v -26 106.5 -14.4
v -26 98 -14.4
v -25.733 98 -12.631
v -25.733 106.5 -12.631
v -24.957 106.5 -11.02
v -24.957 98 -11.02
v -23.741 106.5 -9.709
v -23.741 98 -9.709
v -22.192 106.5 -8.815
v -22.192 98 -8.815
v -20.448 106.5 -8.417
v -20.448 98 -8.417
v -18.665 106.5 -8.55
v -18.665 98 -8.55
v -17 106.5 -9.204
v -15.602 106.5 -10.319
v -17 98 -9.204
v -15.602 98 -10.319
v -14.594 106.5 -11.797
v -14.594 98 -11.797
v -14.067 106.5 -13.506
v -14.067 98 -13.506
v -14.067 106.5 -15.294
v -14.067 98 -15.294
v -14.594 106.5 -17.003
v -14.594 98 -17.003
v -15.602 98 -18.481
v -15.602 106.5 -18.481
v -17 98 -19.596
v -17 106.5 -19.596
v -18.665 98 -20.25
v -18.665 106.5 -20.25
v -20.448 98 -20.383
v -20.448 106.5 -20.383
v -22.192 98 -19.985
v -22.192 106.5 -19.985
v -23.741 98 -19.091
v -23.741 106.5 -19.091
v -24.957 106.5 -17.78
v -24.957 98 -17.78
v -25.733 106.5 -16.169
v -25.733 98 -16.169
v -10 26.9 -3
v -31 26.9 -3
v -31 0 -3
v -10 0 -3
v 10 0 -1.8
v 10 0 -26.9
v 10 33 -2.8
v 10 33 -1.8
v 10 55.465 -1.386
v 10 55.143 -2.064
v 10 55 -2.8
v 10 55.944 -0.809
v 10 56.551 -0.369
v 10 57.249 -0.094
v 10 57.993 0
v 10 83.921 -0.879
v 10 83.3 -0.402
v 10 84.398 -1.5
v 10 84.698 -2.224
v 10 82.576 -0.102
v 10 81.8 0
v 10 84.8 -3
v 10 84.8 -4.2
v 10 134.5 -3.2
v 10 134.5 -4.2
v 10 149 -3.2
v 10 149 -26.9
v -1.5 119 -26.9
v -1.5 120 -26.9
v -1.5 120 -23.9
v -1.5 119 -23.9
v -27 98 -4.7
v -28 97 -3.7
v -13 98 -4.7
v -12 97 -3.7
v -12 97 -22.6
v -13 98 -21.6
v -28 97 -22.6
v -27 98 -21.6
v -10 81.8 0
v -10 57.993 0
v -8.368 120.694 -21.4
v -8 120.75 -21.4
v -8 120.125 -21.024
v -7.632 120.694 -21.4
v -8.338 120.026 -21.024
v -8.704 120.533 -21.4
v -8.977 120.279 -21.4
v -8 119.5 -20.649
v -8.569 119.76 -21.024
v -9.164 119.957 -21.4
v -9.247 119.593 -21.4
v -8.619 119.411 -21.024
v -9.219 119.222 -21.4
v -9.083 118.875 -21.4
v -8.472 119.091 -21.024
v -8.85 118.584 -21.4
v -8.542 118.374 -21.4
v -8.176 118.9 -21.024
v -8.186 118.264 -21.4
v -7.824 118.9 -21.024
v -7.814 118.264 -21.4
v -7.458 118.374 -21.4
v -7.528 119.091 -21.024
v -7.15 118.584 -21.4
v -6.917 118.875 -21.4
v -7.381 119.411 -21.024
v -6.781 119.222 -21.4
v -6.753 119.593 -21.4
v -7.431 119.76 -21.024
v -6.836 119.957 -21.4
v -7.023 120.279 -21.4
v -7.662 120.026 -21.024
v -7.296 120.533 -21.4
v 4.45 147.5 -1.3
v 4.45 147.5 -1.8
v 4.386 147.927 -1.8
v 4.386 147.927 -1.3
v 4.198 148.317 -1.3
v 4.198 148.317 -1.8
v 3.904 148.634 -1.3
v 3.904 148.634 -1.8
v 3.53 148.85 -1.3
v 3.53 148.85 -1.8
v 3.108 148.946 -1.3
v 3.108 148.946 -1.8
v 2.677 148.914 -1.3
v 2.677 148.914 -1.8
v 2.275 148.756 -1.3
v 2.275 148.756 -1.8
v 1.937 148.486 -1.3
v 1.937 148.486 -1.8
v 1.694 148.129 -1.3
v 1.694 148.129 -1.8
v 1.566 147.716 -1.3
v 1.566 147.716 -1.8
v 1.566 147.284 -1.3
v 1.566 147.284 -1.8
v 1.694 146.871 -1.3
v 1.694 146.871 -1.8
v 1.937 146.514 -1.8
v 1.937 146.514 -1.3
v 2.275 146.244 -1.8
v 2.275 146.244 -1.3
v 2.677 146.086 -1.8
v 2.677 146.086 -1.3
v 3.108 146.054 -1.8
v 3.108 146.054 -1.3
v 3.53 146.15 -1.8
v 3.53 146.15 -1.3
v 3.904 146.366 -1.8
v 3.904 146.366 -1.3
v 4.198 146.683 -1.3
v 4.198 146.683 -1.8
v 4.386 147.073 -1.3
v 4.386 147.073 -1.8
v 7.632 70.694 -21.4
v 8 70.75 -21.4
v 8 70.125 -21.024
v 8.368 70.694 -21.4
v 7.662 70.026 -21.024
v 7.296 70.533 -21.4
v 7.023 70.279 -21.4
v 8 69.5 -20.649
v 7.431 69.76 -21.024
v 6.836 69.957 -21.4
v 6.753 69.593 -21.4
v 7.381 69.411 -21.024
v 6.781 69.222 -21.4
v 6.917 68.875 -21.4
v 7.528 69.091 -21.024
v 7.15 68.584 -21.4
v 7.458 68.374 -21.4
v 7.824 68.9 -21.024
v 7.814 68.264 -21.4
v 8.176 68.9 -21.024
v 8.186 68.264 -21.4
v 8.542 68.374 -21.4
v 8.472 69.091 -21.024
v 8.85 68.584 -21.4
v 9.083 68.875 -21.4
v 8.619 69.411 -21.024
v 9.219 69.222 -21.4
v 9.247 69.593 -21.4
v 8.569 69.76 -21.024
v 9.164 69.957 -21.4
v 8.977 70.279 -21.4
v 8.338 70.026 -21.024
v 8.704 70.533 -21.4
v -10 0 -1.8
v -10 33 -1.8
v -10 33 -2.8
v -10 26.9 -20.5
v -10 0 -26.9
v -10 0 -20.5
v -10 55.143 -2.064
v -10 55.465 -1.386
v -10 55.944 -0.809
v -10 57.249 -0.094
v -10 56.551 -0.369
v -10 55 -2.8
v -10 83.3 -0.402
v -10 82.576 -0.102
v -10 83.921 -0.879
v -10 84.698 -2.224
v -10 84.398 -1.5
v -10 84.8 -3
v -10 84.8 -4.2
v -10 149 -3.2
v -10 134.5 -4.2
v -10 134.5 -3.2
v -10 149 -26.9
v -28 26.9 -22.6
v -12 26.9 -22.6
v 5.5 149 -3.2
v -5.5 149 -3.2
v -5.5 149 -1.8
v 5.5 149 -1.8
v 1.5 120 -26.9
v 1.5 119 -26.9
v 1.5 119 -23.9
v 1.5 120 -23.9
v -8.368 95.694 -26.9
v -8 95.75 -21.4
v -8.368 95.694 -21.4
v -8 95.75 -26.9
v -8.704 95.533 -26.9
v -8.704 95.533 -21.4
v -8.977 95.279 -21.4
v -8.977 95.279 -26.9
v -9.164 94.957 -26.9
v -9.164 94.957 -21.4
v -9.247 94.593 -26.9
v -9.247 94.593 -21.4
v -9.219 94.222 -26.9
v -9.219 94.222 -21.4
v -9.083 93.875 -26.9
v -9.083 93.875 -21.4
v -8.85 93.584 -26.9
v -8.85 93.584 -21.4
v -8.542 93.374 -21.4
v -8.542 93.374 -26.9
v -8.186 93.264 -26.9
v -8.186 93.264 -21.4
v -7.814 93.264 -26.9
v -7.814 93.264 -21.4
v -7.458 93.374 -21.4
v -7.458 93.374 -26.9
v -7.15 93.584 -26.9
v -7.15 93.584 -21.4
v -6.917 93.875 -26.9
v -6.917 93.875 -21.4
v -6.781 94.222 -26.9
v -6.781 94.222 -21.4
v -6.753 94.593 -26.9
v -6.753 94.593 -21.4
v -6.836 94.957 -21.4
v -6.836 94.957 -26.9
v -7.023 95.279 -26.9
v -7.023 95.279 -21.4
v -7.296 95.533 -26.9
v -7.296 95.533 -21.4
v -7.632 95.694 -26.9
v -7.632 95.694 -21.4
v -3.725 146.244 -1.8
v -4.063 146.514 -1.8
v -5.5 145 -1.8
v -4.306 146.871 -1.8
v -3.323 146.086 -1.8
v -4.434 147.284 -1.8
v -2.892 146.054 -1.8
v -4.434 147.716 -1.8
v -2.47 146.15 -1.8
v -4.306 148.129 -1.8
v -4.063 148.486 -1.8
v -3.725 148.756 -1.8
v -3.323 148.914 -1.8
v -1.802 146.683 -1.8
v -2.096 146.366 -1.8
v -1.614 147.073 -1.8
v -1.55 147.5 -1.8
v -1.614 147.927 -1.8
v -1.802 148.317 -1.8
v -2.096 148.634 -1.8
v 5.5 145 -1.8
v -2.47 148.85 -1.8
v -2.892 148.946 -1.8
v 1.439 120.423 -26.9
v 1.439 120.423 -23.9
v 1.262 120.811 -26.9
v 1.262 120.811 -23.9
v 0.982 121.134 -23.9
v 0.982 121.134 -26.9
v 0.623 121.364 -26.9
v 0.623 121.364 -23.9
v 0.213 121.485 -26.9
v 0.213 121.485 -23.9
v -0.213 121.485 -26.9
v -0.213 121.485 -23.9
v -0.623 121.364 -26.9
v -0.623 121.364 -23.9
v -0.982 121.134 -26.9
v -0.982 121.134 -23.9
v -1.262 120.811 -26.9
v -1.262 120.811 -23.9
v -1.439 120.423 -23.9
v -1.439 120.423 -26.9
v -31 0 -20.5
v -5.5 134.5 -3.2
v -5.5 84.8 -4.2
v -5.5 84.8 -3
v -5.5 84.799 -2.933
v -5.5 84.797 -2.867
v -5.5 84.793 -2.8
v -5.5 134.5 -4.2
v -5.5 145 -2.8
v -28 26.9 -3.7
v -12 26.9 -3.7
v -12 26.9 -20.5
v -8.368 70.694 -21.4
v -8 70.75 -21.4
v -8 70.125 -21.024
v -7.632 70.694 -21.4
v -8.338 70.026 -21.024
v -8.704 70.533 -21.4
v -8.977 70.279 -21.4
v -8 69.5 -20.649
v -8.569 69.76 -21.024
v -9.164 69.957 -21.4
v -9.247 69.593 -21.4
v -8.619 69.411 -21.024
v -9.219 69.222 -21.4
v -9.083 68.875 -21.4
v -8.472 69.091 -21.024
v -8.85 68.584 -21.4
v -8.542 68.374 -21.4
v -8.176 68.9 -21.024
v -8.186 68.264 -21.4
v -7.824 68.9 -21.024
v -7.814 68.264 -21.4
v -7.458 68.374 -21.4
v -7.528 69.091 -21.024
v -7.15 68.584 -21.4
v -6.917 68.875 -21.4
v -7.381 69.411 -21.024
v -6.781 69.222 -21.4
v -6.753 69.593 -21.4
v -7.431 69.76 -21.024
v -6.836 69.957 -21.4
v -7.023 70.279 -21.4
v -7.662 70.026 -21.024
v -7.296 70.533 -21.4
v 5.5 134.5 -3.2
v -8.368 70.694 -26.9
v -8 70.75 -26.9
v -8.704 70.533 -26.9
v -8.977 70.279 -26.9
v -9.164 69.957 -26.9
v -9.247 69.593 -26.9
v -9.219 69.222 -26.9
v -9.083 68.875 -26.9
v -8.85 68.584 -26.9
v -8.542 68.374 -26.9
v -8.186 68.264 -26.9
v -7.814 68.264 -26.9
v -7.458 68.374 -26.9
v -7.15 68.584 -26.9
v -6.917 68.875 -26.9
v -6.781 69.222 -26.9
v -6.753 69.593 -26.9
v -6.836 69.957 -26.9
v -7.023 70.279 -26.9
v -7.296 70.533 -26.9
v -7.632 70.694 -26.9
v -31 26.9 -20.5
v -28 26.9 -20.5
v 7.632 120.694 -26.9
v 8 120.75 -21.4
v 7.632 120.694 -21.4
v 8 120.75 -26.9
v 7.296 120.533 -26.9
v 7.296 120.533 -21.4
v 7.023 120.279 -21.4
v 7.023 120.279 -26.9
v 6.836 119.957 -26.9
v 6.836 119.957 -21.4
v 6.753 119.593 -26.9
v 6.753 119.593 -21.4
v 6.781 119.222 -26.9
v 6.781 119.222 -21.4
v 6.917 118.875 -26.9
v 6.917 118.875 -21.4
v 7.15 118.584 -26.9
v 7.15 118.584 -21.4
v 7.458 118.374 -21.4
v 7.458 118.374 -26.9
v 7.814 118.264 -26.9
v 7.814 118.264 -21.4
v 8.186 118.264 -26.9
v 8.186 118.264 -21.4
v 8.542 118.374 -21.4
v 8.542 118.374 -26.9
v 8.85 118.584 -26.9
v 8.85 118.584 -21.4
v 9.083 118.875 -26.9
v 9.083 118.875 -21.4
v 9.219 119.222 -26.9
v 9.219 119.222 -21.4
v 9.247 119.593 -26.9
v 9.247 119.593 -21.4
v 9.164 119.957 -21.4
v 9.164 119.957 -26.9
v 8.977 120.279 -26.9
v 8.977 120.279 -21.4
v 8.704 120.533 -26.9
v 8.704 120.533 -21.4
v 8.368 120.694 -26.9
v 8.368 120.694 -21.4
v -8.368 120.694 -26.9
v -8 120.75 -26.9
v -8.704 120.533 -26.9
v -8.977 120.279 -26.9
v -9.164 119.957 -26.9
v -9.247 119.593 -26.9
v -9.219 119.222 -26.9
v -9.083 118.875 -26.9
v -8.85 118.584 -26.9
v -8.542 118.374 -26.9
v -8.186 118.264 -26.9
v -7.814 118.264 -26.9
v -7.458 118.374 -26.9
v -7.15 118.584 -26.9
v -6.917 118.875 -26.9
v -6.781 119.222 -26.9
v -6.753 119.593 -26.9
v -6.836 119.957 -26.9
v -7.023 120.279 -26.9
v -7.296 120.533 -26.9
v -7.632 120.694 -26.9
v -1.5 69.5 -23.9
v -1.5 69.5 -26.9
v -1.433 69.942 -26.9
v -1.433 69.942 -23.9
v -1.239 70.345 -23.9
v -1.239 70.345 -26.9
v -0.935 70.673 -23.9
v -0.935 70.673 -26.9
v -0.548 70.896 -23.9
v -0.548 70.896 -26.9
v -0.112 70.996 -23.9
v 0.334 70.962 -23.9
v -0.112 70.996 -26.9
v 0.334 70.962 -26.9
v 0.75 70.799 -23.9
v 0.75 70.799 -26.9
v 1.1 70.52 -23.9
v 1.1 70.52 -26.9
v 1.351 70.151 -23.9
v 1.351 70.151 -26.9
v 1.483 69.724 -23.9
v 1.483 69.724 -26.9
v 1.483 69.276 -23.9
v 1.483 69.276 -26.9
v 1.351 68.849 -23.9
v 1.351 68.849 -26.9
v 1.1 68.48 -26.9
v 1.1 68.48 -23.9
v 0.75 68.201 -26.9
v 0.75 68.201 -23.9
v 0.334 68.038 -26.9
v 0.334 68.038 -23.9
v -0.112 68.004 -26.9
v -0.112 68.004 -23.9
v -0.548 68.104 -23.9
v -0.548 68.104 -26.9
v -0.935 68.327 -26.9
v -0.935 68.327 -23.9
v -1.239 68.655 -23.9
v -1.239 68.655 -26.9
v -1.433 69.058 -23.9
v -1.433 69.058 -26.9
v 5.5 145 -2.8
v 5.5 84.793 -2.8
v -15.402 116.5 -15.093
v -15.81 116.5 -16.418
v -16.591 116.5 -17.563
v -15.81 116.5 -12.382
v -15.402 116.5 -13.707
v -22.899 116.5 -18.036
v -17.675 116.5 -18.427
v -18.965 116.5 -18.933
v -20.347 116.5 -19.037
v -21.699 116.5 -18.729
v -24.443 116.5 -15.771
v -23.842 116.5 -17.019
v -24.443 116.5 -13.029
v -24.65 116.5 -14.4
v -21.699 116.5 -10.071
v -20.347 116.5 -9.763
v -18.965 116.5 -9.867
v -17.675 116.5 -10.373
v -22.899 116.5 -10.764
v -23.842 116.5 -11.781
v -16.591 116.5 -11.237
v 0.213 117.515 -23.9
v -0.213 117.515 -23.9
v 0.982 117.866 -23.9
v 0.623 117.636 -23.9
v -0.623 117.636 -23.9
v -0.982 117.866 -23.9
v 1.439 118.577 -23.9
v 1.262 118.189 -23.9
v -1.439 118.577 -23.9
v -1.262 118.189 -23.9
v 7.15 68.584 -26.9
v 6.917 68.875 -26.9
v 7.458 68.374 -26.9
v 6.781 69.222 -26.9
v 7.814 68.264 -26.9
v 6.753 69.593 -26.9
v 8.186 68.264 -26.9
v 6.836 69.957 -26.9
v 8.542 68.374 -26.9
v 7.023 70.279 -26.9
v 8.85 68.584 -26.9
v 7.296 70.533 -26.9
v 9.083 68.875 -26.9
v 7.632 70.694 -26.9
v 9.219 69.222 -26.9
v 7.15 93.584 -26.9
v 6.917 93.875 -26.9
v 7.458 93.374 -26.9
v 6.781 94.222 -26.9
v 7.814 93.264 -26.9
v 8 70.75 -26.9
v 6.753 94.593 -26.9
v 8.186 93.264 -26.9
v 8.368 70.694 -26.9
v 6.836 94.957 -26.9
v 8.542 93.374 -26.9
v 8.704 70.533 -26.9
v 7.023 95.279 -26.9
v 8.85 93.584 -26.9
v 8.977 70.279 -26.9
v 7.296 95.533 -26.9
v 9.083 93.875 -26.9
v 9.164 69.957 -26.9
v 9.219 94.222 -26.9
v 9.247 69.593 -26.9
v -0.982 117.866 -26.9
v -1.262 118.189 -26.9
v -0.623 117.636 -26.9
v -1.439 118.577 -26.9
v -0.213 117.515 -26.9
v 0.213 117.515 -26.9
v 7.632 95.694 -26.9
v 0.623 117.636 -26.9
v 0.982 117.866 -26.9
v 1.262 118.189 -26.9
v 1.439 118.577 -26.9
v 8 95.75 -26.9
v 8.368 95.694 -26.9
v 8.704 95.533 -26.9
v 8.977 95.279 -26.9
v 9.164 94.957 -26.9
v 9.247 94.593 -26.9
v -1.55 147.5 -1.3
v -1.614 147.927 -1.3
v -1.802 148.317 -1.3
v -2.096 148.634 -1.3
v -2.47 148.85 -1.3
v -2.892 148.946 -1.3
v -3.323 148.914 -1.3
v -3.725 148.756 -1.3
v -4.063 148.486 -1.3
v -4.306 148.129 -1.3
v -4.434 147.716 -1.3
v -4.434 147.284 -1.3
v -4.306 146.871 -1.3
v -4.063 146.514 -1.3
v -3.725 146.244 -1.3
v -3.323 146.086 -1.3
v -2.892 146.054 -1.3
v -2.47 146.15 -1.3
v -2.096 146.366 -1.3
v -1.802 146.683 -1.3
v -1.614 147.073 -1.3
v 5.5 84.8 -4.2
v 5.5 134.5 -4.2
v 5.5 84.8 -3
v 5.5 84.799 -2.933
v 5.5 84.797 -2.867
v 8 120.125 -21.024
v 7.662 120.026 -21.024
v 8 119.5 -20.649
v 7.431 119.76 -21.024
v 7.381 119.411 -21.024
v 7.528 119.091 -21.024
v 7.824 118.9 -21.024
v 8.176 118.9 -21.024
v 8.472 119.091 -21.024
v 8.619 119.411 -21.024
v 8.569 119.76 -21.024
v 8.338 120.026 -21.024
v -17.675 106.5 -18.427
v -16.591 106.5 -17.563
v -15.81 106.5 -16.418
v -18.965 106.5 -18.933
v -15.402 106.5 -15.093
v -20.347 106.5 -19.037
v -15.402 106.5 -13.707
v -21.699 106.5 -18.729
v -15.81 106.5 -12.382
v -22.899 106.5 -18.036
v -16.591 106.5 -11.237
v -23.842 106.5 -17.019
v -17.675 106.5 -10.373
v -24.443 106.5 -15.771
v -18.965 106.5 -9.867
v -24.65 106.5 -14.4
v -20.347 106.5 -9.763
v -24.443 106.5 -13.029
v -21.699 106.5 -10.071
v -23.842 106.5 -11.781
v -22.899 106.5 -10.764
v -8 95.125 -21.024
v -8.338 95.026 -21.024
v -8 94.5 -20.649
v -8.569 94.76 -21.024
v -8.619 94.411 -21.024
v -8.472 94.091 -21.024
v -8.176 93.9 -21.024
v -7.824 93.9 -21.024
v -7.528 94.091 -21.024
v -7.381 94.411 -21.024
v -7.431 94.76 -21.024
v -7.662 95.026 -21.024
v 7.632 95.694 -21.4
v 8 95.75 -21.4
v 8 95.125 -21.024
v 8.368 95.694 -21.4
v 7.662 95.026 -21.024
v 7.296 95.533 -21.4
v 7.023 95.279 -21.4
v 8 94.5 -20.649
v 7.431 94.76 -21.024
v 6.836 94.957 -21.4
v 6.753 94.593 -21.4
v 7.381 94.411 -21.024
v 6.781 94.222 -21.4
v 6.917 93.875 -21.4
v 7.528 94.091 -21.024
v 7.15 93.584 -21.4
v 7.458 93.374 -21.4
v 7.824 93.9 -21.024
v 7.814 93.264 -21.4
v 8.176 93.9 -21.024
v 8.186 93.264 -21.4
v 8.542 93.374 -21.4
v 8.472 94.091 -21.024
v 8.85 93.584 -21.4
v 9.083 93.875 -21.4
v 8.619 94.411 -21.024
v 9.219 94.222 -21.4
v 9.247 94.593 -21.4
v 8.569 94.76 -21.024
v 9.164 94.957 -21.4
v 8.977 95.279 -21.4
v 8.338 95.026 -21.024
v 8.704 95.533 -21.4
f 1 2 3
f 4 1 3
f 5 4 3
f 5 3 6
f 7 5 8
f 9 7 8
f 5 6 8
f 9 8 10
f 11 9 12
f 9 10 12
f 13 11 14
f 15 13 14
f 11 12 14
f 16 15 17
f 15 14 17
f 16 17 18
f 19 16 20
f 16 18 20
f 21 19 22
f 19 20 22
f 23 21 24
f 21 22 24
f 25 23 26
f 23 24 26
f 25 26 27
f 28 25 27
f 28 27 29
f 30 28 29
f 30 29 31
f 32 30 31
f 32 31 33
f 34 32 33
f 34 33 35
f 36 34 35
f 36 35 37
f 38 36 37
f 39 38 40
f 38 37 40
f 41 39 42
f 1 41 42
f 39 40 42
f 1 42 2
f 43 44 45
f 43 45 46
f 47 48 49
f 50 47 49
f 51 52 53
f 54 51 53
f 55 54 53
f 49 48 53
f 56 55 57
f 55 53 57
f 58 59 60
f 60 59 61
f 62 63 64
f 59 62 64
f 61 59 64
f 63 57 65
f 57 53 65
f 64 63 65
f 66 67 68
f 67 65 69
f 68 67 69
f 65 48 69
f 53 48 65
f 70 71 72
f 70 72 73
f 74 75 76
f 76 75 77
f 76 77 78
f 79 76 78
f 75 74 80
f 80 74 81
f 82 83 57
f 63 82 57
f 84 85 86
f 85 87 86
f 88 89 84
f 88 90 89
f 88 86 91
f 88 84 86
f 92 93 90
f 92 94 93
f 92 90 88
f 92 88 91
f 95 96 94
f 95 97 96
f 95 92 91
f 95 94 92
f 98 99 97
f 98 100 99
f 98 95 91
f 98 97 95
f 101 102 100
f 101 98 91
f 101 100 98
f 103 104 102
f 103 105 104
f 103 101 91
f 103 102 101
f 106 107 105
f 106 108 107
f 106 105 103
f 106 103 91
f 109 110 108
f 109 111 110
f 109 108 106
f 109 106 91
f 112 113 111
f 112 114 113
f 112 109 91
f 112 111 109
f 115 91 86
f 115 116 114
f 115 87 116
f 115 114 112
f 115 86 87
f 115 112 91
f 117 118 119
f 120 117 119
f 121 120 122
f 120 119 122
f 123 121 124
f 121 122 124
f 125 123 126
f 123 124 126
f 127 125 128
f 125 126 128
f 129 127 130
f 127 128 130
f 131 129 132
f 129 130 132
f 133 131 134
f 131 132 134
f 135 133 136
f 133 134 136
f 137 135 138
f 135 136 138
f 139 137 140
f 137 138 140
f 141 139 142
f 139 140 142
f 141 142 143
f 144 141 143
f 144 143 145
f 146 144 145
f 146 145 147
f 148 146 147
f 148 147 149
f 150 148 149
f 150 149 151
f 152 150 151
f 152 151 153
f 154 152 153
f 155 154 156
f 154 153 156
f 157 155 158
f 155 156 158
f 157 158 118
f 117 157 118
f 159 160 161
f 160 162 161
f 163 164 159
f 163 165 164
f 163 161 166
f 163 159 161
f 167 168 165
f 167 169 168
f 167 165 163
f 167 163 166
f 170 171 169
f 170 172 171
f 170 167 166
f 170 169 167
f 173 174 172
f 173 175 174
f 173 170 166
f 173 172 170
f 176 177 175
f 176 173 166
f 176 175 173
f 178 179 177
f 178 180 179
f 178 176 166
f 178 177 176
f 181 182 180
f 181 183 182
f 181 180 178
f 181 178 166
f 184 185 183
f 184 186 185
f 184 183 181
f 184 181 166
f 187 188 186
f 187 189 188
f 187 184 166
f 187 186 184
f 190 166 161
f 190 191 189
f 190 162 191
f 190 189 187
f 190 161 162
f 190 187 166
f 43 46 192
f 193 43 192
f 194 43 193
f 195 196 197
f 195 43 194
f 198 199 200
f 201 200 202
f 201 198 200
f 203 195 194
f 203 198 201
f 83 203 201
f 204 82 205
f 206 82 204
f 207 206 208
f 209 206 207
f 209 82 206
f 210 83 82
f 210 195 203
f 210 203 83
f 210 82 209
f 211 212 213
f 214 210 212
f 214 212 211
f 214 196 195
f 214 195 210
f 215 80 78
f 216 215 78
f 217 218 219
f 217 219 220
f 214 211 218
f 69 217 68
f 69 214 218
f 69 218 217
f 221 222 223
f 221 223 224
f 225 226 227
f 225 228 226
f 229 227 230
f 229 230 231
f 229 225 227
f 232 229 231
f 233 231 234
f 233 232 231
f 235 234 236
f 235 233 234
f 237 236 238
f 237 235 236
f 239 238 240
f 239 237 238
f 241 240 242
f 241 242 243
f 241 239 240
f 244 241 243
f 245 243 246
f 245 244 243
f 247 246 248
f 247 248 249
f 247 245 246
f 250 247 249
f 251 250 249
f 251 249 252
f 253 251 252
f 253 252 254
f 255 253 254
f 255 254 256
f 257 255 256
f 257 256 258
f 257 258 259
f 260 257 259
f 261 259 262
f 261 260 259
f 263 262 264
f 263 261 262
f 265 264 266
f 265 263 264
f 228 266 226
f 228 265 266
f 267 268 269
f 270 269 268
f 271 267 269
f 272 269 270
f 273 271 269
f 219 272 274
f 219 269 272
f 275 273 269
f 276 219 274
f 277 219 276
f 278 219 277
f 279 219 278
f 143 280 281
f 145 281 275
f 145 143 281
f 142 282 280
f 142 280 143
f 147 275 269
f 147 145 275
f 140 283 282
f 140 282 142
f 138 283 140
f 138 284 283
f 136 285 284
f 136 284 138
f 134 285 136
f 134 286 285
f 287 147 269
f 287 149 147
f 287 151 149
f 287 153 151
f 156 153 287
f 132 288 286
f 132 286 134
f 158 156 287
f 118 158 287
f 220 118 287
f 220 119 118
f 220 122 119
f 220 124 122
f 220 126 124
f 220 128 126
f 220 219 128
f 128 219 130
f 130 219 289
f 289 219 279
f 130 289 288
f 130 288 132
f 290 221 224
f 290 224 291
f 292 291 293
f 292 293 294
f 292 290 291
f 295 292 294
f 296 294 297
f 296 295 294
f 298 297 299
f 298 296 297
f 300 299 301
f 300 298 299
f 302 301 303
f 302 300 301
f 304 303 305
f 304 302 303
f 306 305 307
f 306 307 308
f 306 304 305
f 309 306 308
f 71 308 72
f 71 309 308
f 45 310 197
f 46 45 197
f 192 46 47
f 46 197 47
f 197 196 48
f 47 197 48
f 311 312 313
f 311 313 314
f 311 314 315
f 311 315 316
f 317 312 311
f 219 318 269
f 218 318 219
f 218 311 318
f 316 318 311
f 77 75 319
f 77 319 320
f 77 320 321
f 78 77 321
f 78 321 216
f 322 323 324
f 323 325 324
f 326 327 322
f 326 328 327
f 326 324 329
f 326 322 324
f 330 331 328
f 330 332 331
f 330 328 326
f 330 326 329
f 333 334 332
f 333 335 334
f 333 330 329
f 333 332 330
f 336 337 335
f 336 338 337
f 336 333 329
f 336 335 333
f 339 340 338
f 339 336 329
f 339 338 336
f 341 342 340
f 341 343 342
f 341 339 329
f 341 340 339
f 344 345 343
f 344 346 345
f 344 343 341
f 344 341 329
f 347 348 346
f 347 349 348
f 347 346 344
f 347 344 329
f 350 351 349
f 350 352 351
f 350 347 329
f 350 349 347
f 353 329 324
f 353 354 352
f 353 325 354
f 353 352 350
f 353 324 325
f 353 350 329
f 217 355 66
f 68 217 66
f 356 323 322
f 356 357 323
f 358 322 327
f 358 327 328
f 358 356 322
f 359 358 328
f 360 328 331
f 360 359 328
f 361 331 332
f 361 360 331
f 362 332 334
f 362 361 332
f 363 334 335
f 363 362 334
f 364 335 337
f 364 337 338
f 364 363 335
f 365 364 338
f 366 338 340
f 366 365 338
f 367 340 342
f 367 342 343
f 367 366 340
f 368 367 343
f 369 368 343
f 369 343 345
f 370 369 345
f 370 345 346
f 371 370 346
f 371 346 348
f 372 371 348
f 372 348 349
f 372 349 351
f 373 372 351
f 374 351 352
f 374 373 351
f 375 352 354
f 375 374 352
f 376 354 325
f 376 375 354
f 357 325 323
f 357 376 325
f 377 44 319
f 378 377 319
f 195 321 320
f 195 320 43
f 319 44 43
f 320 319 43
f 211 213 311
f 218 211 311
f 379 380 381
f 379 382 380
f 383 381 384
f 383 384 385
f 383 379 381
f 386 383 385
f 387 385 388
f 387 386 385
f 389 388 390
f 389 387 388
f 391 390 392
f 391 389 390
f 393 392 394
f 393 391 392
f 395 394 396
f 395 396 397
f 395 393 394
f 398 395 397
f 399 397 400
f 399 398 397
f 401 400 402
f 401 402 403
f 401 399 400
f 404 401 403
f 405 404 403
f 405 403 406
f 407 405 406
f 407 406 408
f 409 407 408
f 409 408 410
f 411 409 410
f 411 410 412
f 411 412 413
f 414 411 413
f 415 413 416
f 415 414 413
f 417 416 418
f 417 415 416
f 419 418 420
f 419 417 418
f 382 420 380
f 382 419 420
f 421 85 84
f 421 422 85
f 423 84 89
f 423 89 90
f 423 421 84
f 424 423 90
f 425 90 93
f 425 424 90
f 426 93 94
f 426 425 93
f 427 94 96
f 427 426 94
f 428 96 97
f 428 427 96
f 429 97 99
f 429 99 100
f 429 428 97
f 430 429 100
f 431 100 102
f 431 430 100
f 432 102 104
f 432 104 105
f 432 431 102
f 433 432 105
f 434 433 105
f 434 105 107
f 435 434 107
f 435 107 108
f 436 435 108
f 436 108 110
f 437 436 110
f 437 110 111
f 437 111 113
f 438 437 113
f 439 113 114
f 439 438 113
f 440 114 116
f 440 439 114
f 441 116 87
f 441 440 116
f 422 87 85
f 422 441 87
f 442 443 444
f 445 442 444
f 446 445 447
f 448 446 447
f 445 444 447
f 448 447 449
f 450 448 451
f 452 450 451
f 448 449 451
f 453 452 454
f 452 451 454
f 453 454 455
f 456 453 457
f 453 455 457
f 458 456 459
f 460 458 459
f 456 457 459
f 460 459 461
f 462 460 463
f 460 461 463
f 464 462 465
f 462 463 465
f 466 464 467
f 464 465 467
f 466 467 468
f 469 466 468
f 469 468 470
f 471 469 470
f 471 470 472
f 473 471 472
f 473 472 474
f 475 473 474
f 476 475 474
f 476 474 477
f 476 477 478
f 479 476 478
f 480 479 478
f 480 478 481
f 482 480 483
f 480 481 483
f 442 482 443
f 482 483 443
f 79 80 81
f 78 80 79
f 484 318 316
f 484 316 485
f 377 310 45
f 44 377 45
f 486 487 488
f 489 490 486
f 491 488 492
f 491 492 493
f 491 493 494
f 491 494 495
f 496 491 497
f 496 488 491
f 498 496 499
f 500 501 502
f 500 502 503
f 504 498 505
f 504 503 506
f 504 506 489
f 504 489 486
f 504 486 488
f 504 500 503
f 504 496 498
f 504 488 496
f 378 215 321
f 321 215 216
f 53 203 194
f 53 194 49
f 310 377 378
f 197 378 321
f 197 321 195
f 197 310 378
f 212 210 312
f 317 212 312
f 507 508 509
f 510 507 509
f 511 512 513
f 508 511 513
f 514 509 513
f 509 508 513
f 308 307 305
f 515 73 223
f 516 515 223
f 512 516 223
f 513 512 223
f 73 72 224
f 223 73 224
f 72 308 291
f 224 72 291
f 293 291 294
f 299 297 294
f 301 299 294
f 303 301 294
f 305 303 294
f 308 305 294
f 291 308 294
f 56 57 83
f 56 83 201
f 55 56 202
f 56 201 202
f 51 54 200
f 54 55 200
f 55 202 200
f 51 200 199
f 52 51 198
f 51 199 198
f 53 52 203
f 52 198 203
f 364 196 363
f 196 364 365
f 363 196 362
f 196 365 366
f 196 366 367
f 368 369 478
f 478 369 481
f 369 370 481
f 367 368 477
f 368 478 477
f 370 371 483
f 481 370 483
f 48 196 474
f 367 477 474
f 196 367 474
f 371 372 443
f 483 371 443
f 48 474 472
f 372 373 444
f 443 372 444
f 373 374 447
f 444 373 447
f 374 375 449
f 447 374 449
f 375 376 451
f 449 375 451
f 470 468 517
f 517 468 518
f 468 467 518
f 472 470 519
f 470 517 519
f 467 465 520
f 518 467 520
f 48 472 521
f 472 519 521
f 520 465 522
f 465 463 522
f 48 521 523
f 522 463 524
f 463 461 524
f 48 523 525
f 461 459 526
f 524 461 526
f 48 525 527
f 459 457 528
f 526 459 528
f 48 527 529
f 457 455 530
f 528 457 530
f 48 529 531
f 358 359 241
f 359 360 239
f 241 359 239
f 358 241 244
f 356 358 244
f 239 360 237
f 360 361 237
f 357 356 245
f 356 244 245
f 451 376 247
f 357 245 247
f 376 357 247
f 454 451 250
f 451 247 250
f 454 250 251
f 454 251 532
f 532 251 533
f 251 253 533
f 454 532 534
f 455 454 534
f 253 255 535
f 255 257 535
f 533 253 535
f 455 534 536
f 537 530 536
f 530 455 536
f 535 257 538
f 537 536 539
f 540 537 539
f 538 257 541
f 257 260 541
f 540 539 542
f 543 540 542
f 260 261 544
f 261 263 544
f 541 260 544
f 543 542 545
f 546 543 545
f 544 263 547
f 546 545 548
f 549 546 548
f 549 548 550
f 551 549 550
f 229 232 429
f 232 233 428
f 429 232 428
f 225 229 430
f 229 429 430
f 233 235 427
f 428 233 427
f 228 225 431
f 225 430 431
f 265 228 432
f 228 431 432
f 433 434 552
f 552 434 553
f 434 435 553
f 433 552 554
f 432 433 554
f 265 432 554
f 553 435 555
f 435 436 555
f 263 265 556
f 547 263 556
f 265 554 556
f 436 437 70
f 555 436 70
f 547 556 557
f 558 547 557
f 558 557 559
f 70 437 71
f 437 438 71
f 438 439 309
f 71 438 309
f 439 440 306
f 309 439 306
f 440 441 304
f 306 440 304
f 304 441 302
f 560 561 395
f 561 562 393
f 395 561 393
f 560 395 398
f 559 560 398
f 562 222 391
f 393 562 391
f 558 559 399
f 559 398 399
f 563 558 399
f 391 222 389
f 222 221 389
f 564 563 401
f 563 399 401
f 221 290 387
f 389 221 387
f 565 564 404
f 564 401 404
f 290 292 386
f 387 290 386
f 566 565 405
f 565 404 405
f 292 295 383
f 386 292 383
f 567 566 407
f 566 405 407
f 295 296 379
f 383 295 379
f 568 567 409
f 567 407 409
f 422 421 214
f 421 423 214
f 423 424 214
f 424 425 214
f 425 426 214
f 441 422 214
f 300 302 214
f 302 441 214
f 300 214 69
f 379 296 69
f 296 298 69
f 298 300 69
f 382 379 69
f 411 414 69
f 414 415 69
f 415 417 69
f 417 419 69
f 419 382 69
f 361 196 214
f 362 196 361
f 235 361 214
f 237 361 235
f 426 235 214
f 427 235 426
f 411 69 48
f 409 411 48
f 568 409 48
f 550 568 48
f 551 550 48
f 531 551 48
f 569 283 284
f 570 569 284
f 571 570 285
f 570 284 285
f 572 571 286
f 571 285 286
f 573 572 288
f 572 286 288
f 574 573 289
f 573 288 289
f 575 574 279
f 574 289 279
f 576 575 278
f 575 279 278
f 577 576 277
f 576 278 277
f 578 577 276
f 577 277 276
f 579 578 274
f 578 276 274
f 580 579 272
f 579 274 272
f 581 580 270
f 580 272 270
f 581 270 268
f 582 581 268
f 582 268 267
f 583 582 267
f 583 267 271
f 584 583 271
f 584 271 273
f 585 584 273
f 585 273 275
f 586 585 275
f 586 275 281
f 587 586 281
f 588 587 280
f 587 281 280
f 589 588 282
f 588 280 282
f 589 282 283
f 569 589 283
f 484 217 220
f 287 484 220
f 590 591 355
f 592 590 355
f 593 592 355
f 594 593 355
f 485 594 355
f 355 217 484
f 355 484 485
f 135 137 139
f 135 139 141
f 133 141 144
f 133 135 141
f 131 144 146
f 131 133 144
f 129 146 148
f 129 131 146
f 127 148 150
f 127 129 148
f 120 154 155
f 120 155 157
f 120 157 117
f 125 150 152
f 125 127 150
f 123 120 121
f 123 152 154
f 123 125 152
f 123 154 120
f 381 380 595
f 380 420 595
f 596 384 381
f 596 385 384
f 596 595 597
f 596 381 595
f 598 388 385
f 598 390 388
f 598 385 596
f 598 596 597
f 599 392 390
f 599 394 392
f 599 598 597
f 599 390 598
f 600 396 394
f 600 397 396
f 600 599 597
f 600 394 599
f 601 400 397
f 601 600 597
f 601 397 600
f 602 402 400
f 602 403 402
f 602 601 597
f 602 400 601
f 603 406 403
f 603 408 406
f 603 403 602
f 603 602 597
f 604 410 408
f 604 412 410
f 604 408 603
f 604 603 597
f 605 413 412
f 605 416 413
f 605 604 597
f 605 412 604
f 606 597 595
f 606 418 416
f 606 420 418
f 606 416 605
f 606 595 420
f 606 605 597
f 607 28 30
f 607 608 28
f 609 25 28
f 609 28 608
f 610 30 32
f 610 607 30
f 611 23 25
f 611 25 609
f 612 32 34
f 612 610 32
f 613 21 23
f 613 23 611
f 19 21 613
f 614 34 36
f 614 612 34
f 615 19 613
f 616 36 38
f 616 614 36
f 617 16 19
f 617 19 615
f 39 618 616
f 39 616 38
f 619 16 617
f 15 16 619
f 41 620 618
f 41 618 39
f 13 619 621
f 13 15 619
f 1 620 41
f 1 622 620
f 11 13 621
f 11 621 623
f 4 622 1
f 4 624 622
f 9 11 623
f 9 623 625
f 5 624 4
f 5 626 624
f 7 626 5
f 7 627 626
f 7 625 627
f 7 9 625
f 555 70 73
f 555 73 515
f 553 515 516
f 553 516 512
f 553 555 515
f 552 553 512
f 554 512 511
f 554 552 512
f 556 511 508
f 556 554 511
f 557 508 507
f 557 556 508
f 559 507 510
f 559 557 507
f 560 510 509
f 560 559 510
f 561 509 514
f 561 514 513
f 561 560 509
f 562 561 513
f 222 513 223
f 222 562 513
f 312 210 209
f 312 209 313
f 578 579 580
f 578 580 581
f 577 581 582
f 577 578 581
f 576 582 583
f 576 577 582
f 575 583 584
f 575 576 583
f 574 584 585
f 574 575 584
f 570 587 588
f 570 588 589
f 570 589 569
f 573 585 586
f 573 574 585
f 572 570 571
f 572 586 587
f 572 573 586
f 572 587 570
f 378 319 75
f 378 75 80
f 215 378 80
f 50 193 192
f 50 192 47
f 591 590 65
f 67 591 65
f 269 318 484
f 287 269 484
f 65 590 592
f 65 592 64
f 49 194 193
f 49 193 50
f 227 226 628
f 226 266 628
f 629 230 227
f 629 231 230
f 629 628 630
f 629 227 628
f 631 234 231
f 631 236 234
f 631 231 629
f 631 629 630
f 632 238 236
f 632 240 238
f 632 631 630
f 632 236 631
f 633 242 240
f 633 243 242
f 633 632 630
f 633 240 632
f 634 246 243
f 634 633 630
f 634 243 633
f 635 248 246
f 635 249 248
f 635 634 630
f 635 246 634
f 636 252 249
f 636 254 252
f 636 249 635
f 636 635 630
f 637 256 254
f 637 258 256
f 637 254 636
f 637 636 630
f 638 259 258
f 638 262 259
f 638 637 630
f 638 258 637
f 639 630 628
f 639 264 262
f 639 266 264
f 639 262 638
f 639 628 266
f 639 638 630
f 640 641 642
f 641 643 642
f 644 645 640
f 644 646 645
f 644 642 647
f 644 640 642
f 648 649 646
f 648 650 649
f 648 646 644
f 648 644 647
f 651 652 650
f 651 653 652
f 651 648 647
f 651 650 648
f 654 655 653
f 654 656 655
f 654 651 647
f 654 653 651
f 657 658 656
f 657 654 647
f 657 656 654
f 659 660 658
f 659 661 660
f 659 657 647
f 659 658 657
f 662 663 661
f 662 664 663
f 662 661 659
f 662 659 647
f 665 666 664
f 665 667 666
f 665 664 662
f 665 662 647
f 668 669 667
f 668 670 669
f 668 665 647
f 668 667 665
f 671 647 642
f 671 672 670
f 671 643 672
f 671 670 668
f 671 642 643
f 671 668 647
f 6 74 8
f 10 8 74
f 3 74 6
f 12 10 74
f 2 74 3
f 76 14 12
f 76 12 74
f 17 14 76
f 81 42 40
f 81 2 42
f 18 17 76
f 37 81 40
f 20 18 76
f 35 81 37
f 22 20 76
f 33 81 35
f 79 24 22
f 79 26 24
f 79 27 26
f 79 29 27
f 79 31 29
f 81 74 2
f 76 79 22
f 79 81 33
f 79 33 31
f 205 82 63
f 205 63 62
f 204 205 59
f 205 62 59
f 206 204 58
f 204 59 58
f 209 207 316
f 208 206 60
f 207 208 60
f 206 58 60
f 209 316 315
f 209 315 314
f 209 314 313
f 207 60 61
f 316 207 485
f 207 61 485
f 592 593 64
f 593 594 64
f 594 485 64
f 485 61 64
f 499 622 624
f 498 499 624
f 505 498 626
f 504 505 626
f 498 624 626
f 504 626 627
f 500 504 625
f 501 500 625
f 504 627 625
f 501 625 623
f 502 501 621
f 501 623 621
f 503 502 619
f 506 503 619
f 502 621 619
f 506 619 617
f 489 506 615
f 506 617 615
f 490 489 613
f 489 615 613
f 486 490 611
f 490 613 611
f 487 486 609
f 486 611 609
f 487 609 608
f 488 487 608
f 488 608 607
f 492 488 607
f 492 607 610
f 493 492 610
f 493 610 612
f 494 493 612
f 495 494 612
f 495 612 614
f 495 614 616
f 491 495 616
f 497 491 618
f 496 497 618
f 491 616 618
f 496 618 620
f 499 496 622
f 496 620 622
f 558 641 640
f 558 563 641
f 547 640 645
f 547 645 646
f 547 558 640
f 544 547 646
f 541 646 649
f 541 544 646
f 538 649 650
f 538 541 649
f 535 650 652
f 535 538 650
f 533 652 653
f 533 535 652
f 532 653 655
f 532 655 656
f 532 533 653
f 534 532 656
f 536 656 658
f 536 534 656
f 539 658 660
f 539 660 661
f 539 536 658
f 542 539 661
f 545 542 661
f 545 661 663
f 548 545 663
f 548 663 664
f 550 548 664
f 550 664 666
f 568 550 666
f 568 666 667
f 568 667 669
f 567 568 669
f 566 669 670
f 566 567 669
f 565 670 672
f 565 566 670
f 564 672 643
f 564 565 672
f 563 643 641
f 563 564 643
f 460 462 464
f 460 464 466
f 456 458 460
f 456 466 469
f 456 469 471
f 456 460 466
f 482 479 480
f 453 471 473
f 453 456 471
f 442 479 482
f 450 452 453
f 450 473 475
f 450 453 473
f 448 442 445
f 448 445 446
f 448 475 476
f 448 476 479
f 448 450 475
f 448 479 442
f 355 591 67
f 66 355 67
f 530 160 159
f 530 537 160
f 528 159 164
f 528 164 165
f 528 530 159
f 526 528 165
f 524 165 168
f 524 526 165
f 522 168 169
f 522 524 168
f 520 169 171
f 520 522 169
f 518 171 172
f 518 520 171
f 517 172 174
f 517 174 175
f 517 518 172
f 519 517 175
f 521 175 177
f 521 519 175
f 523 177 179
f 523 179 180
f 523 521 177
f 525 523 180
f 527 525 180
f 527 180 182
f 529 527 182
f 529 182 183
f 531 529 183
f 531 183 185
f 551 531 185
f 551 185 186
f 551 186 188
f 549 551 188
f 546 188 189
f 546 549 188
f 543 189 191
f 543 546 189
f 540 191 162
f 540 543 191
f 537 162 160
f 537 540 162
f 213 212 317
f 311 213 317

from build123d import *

# Parameters (mm, degrees)
SKETCH1_W                      = 20
SKETCH1_H                      = 149
BOSS_EXTRUDE1_DEPTH            = 26.9
SKETCH2_W                      = 21
SKETCH2_H                      = 17.5
BOSS_EXTRUDE2_DEPTH            = 26.9
SKETCH3_W                      = 16
SKETCH3_H                      = 18.9
BOSS_EXTRUDE3_DEPTH            = 71.1
SKETCH4_R                      = 6
BOSS_EXTRUDE4_DEPTH            = 8.5
SKETCH5_R                      = 4.65
BOSS_EXTRUDE5_DEPTH            = 10
SKETCH7_W                      = 20
SKETCH7_H                      = 149
CUT_EXTRUDE1_DEPTH             = 2.8
SKETCH8_W                      = 4.5
SKETCH8_H                      = 94
CUT_EXTRUDE2_DEPTH             = 1.4
SKETCH17_R                     = 1.5
CUT_EXTRUDE3_DEPTH             = 3
SKETCH9_W                      = 20
SKETCH9_H                      = 29.8
BOSS_EXTRUDE6_DEPTH            = 4.2
SKETCH12_W                     = 20
SKETCH12_H                     = 33
BOSS_EXTRUDE7_DEPTH            = 1
SKETCH14_W                     = 11
SKETCH14_H                     = 4
BOSS_EXTRUDE8_DEPTH            = 1
SKETCH15_R                     = 1.45
BOSS_EXTRUDE9_DEPTH            = 0.5
SKETCH16_W                     = 4.5
SKETCH16_H                     = 14.5
BOSS_EXTRUDE10_DEPTH           = 1
M3X0_5_TAPPED_HOLE1_AT_2_COUNT = 2
M3X0_5_TAPPED_HOLE1_AT_2_PITCH = 16
LPATTERN1_COUNT                = 3
LPATTERN1_PITCH                = 25
FILLET1_R                      = 3
CHAMFER1_SIZE                  = 1


with BuildPart() as part:
    # Sketch1 → Boss-Extrude1 (new body)
    with BuildSketch(Plane.XY):
        with Locations((0, 74.5)):
            Rectangle(SKETCH1_W, SKETCH1_H)
    extrude(amount=-BOSS_EXTRUDE1_DEPTH)

    # Sketch2 → Boss-Extrude2 (add)
    with BuildSketch(Plane.XZ):
        with Locations((-20.5, -11.75)):
            Rectangle(SKETCH2_W, SKETCH2_H)
    extrude(amount=-BOSS_EXTRUDE2_DEPTH)

    # Sketch3 → Boss-Extrude3 (add)
    with BuildSketch(Plane(origin=(0, 26.9, 0), x_dir=(1, 0, 0), z_dir=(0, 1, 0))):
        with Locations((-20, 13.15)):
            Rectangle(SKETCH3_W, SKETCH3_H)
    extrude(amount=BOSS_EXTRUDE3_DEPTH)

    # Sketch4 → Boss-Extrude4 (add)
    with BuildSketch(Plane(origin=(0, 98, 0), x_dir=(1, 0, 0), z_dir=(0, 1, 0))):
        with Locations(Location((-20, 14.4, 0), (0, 0, 180))):
            Circle(SKETCH4_R)
    extrude(amount=BOSS_EXTRUDE4_DEPTH)

    # Sketch5 → Boss-Extrude5 (add)
    with BuildSketch(Plane(origin=(0, 106.5, 0), x_dir=(1, 0, 0), z_dir=(0, 1, 0))):
        with Locations(Location((-20, 14.4, 0), (0, 0, 180))):
            Circle(SKETCH5_R)
    extrude(amount=BOSS_EXTRUDE5_DEPTH)

    # Sketch7 → Cut-Extrude1 (cut)
    with BuildSketch(Plane.XY):
        with Locations((0, 74.5)):
            Rectangle(SKETCH7_W, SKETCH7_H)
    extrude(amount=-CUT_EXTRUDE1_DEPTH, mode=Mode.SUBTRACT)

    # Sketch8 → Cut-Extrude2 (cut)
    with BuildSketch(Plane.XY.offset(-2.8)):
        with Locations((-7.75, 102)):
            Rectangle(SKETCH8_W, SKETCH8_H)
        with Locations((7.75, 102)):
            Rectangle(SKETCH8_W, SKETCH8_H)
    extrude(amount=-CUT_EXTRUDE2_DEPTH, mode=Mode.SUBTRACT)

    # Sketch17 → Cut-Extrude3 (cut)
    with BuildSketch(Plane(origin=(0, 0, -26.9), x_dir=(-1, 0, 0), z_dir=(0, 0, -1))):
        with Locations((0, 69.5)):
            Circle(SKETCH17_R)
        with BuildLine():
            Line((1.5, 120), (1.5, 119))
            ThreePointArc((1.5, 119), (0, 117.5), (-1.5, 119))
            Line((-1.5, 119), (-1.5, 120))
            ThreePointArc((-1.5, 120), (0, 121.5), (1.5, 120))
        make_face()
    extrude(amount=-CUT_EXTRUDE3_DEPTH, mode=Mode.SUBTRACT)

    # Sketch9 → Boss-Extrude6 (add)
    with BuildSketch(Plane.XY.offset(-4.2)):
        with Locations((0, 69.9)):
            Rectangle(SKETCH9_W, SKETCH9_H)
    extrude(amount=BOSS_EXTRUDE6_DEPTH)

    # Sketch12 → Boss-Extrude7 (add)
    with BuildSketch(Plane.XY.offset(-2.8)):
        with Locations((0, 16.5)):
            Rectangle(SKETCH12_W, SKETCH12_H)
    extrude(amount=BOSS_EXTRUDE7_DEPTH)

    # Sketch14 → Boss-Extrude8 (add)
    with BuildSketch(Plane.XY.offset(-2.8)):
        with Locations((0, 147)):
            Rectangle(SKETCH14_W, SKETCH14_H)
    extrude(amount=BOSS_EXTRUDE8_DEPTH)

    # Sketch15 → Boss-Extrude9 (add)
    with BuildSketch(Plane.XY.offset(-1.8)):
        with Locations((-3, 147.5)):
            Circle(SKETCH15_R)
        with Locations((3, 147.5)):
            Circle(SKETCH15_R)
    extrude(amount=BOSS_EXTRUDE9_DEPTH)

    # Sketch16 → Boss-Extrude10 (add)
    with BuildSketch(Plane.XY.offset(-4.2)):
        with Locations((-7.75, 141.75)):
            Rectangle(SKETCH16_W, SKETCH16_H)
        with Locations((7.75, 141.75)):
            Rectangle(SKETCH16_W, SKETCH16_H)
    extrude(amount=BOSS_EXTRUDE10_DEPTH)

    # Sketch10 → M3x0.5 Tapped Hole1 (revolve, cut)
    with BuildSketch(Plane(origin=(8, 69.5, -26.9), x_dir=(0, 1, 0), z_dir=(1, 0, 0))):
        Polygon((0, 0), (0, 6.251075774), (1.25, 5.5), (1.25, 0), align=None)
    m3x0_5_tapped_hole1 = revolve(axis=Axis((8, 69.5, -33.25), (0, 0, 1)), mode=Mode.SUBTRACT)

    # M3x0.5 Tapped Hole1 at 2: M3x0.5 Tapped Hole1 ×2
    with Locations(*[(-i * M3X0_5_TAPPED_HOLE1_AT_2_PITCH, 0, 0) for i in range(1, M3X0_5_TAPPED_HOLE1_AT_2_COUNT)]):
        add(m3x0_5_tapped_hole1, mode=Mode.SUBTRACT)

    # LPattern1: M3x0.5 Tapped Hole1 ×3
    with Locations(*[(0, i * LPATTERN1_PITCH, 0) for i in range(1, LPATTERN1_COUNT)]):
        add(m3x0_5_tapped_hole1, mode=Mode.SUBTRACT)

    # LPattern1 copy 1 sketch → LPattern1 copy 1 (revolve, cut)
    with BuildSketch(Plane(origin=(-8, 94.5, -26.9), x_dir=(0, 1, 0), z_dir=(1, 0, 0))):
        Polygon((0, 0), (0, 6.251075774), (1.25, 5.5), (1.25, 0), align=None)
    revolve(axis=Axis((-8, 94.5, -33.25), (0, 0, 1)), mode=Mode.SUBTRACT)

    # LPattern1 copy 2 sketch → LPattern1 copy 2 (revolve, cut)
    with BuildSketch(Plane(origin=(-8, 119.5, -26.9), x_dir=(0, 1, 0), z_dir=(1, 0, 0))):
        Polygon((0, 0), (0, 6.251075774), (1.25, 5.5), (1.25, 0), align=None)
    revolve(axis=Axis((-8, 119.5, -33.25), (0, 0, 1)), mode=Mode.SUBTRACT)

    # Fillet1
    # the kernel refuses this fillet: 3 mm, written as the material it takes off along each edge
    with BuildSketch(Plane(origin=(-17.483314774, 55, 0), x_dir=(0, 1, 0), z_dir=(1, 0, 0))) as fillet1_piece_1:
        with BuildLine():
            CenterArc((2.993325909, -3), FILLET1_R, 90, 86.177446271)
            Line((0, -2.8), (0, 0))
            Line((0, 0), (2.993325909, 0))
        make_face()
    extrude(amount=34.966629547, mode=Mode.SUBTRACT)
    with BuildSketch(Plane(origin=(17.5, 84.8, 0), x_dir=(0, 0, -1), z_dir=(-1, 0, 0))) as fillet1_piece_2_section:
        with BuildLine():
            CenterArc((FILLET1_R, FILLET1_R), FILLET1_R, 180, 90)
            Line((0, FILLET1_R), (0, 0))
            Line((0, 0), (FILLET1_R, 0))
        make_face()
    fillet1_piece_2 = extrude(amount=35, mode=Mode.PRIVATE)
    fillet1_piece_2 = split(fillet1_piece_2, bisect_by=Plane(origin=(5.5, 84.8, 0), z_dir=(1, 0, 0)), keep=Keep.TOP, mode=Mode.PRIVATE)
    add(fillet1_piece_2, mode=Mode.SUBTRACT)
    with BuildSketch(Plane(origin=(17.5, 84.8, 0), x_dir=(0, 0, -1), z_dir=(-1, 0, 0))) as fillet1_piece_3_section:
        with BuildLine():
            CenterArc((FILLET1_R, FILLET1_R), FILLET1_R, 180, 90)
            Line((0, FILLET1_R), (0, 0))
            Line((0, 0), (FILLET1_R, 0))
        make_face()
    fillet1_piece_3 = extrude(amount=35, mode=Mode.PRIVATE)
    fillet1_piece_3 = split(fillet1_piece_3, bisect_by=Plane(origin=(17.5, 84.8, -2.8), z_dir=(0, 0, 1)), keep=Keep.TOP, mode=Mode.PRIVATE)
    add(fillet1_piece_3, mode=Mode.SUBTRACT)
    with BuildSketch(Plane(origin=(17.5, 84.8, 0), x_dir=(0, 0, -1), z_dir=(-1, 0, 0))) as fillet1_piece_4_section:
        with BuildLine():
            CenterArc((FILLET1_R, FILLET1_R), FILLET1_R, 180, 90)
            Line((0, FILLET1_R), (0, 0))
            Line((0, 0), (FILLET1_R, 0))
        make_face()
    fillet1_piece_4 = extrude(amount=35, mode=Mode.PRIVATE)
    fillet1_piece_4 = split(fillet1_piece_4, bisect_by=Plane(origin=(-5.5, 84.8, 0), z_dir=(-1, 0, 0)), keep=Keep.TOP, mode=Mode.PRIVATE)
    add(fillet1_piece_4, mode=Mode.SUBTRACT)

    # Chamfer1
    chamfer1_edges = [part.edges().sort_by_distance(p)[0] for p in [
        (-28, 98, -13.15),
        (-20, 98, -3.7),
        (-12, 98, -13.15),
        (-20, 98, -22.6),
    ]]
    chamfer(chamfer1_edges, length=CHAMFER1_SIZE)


solid = part.part
